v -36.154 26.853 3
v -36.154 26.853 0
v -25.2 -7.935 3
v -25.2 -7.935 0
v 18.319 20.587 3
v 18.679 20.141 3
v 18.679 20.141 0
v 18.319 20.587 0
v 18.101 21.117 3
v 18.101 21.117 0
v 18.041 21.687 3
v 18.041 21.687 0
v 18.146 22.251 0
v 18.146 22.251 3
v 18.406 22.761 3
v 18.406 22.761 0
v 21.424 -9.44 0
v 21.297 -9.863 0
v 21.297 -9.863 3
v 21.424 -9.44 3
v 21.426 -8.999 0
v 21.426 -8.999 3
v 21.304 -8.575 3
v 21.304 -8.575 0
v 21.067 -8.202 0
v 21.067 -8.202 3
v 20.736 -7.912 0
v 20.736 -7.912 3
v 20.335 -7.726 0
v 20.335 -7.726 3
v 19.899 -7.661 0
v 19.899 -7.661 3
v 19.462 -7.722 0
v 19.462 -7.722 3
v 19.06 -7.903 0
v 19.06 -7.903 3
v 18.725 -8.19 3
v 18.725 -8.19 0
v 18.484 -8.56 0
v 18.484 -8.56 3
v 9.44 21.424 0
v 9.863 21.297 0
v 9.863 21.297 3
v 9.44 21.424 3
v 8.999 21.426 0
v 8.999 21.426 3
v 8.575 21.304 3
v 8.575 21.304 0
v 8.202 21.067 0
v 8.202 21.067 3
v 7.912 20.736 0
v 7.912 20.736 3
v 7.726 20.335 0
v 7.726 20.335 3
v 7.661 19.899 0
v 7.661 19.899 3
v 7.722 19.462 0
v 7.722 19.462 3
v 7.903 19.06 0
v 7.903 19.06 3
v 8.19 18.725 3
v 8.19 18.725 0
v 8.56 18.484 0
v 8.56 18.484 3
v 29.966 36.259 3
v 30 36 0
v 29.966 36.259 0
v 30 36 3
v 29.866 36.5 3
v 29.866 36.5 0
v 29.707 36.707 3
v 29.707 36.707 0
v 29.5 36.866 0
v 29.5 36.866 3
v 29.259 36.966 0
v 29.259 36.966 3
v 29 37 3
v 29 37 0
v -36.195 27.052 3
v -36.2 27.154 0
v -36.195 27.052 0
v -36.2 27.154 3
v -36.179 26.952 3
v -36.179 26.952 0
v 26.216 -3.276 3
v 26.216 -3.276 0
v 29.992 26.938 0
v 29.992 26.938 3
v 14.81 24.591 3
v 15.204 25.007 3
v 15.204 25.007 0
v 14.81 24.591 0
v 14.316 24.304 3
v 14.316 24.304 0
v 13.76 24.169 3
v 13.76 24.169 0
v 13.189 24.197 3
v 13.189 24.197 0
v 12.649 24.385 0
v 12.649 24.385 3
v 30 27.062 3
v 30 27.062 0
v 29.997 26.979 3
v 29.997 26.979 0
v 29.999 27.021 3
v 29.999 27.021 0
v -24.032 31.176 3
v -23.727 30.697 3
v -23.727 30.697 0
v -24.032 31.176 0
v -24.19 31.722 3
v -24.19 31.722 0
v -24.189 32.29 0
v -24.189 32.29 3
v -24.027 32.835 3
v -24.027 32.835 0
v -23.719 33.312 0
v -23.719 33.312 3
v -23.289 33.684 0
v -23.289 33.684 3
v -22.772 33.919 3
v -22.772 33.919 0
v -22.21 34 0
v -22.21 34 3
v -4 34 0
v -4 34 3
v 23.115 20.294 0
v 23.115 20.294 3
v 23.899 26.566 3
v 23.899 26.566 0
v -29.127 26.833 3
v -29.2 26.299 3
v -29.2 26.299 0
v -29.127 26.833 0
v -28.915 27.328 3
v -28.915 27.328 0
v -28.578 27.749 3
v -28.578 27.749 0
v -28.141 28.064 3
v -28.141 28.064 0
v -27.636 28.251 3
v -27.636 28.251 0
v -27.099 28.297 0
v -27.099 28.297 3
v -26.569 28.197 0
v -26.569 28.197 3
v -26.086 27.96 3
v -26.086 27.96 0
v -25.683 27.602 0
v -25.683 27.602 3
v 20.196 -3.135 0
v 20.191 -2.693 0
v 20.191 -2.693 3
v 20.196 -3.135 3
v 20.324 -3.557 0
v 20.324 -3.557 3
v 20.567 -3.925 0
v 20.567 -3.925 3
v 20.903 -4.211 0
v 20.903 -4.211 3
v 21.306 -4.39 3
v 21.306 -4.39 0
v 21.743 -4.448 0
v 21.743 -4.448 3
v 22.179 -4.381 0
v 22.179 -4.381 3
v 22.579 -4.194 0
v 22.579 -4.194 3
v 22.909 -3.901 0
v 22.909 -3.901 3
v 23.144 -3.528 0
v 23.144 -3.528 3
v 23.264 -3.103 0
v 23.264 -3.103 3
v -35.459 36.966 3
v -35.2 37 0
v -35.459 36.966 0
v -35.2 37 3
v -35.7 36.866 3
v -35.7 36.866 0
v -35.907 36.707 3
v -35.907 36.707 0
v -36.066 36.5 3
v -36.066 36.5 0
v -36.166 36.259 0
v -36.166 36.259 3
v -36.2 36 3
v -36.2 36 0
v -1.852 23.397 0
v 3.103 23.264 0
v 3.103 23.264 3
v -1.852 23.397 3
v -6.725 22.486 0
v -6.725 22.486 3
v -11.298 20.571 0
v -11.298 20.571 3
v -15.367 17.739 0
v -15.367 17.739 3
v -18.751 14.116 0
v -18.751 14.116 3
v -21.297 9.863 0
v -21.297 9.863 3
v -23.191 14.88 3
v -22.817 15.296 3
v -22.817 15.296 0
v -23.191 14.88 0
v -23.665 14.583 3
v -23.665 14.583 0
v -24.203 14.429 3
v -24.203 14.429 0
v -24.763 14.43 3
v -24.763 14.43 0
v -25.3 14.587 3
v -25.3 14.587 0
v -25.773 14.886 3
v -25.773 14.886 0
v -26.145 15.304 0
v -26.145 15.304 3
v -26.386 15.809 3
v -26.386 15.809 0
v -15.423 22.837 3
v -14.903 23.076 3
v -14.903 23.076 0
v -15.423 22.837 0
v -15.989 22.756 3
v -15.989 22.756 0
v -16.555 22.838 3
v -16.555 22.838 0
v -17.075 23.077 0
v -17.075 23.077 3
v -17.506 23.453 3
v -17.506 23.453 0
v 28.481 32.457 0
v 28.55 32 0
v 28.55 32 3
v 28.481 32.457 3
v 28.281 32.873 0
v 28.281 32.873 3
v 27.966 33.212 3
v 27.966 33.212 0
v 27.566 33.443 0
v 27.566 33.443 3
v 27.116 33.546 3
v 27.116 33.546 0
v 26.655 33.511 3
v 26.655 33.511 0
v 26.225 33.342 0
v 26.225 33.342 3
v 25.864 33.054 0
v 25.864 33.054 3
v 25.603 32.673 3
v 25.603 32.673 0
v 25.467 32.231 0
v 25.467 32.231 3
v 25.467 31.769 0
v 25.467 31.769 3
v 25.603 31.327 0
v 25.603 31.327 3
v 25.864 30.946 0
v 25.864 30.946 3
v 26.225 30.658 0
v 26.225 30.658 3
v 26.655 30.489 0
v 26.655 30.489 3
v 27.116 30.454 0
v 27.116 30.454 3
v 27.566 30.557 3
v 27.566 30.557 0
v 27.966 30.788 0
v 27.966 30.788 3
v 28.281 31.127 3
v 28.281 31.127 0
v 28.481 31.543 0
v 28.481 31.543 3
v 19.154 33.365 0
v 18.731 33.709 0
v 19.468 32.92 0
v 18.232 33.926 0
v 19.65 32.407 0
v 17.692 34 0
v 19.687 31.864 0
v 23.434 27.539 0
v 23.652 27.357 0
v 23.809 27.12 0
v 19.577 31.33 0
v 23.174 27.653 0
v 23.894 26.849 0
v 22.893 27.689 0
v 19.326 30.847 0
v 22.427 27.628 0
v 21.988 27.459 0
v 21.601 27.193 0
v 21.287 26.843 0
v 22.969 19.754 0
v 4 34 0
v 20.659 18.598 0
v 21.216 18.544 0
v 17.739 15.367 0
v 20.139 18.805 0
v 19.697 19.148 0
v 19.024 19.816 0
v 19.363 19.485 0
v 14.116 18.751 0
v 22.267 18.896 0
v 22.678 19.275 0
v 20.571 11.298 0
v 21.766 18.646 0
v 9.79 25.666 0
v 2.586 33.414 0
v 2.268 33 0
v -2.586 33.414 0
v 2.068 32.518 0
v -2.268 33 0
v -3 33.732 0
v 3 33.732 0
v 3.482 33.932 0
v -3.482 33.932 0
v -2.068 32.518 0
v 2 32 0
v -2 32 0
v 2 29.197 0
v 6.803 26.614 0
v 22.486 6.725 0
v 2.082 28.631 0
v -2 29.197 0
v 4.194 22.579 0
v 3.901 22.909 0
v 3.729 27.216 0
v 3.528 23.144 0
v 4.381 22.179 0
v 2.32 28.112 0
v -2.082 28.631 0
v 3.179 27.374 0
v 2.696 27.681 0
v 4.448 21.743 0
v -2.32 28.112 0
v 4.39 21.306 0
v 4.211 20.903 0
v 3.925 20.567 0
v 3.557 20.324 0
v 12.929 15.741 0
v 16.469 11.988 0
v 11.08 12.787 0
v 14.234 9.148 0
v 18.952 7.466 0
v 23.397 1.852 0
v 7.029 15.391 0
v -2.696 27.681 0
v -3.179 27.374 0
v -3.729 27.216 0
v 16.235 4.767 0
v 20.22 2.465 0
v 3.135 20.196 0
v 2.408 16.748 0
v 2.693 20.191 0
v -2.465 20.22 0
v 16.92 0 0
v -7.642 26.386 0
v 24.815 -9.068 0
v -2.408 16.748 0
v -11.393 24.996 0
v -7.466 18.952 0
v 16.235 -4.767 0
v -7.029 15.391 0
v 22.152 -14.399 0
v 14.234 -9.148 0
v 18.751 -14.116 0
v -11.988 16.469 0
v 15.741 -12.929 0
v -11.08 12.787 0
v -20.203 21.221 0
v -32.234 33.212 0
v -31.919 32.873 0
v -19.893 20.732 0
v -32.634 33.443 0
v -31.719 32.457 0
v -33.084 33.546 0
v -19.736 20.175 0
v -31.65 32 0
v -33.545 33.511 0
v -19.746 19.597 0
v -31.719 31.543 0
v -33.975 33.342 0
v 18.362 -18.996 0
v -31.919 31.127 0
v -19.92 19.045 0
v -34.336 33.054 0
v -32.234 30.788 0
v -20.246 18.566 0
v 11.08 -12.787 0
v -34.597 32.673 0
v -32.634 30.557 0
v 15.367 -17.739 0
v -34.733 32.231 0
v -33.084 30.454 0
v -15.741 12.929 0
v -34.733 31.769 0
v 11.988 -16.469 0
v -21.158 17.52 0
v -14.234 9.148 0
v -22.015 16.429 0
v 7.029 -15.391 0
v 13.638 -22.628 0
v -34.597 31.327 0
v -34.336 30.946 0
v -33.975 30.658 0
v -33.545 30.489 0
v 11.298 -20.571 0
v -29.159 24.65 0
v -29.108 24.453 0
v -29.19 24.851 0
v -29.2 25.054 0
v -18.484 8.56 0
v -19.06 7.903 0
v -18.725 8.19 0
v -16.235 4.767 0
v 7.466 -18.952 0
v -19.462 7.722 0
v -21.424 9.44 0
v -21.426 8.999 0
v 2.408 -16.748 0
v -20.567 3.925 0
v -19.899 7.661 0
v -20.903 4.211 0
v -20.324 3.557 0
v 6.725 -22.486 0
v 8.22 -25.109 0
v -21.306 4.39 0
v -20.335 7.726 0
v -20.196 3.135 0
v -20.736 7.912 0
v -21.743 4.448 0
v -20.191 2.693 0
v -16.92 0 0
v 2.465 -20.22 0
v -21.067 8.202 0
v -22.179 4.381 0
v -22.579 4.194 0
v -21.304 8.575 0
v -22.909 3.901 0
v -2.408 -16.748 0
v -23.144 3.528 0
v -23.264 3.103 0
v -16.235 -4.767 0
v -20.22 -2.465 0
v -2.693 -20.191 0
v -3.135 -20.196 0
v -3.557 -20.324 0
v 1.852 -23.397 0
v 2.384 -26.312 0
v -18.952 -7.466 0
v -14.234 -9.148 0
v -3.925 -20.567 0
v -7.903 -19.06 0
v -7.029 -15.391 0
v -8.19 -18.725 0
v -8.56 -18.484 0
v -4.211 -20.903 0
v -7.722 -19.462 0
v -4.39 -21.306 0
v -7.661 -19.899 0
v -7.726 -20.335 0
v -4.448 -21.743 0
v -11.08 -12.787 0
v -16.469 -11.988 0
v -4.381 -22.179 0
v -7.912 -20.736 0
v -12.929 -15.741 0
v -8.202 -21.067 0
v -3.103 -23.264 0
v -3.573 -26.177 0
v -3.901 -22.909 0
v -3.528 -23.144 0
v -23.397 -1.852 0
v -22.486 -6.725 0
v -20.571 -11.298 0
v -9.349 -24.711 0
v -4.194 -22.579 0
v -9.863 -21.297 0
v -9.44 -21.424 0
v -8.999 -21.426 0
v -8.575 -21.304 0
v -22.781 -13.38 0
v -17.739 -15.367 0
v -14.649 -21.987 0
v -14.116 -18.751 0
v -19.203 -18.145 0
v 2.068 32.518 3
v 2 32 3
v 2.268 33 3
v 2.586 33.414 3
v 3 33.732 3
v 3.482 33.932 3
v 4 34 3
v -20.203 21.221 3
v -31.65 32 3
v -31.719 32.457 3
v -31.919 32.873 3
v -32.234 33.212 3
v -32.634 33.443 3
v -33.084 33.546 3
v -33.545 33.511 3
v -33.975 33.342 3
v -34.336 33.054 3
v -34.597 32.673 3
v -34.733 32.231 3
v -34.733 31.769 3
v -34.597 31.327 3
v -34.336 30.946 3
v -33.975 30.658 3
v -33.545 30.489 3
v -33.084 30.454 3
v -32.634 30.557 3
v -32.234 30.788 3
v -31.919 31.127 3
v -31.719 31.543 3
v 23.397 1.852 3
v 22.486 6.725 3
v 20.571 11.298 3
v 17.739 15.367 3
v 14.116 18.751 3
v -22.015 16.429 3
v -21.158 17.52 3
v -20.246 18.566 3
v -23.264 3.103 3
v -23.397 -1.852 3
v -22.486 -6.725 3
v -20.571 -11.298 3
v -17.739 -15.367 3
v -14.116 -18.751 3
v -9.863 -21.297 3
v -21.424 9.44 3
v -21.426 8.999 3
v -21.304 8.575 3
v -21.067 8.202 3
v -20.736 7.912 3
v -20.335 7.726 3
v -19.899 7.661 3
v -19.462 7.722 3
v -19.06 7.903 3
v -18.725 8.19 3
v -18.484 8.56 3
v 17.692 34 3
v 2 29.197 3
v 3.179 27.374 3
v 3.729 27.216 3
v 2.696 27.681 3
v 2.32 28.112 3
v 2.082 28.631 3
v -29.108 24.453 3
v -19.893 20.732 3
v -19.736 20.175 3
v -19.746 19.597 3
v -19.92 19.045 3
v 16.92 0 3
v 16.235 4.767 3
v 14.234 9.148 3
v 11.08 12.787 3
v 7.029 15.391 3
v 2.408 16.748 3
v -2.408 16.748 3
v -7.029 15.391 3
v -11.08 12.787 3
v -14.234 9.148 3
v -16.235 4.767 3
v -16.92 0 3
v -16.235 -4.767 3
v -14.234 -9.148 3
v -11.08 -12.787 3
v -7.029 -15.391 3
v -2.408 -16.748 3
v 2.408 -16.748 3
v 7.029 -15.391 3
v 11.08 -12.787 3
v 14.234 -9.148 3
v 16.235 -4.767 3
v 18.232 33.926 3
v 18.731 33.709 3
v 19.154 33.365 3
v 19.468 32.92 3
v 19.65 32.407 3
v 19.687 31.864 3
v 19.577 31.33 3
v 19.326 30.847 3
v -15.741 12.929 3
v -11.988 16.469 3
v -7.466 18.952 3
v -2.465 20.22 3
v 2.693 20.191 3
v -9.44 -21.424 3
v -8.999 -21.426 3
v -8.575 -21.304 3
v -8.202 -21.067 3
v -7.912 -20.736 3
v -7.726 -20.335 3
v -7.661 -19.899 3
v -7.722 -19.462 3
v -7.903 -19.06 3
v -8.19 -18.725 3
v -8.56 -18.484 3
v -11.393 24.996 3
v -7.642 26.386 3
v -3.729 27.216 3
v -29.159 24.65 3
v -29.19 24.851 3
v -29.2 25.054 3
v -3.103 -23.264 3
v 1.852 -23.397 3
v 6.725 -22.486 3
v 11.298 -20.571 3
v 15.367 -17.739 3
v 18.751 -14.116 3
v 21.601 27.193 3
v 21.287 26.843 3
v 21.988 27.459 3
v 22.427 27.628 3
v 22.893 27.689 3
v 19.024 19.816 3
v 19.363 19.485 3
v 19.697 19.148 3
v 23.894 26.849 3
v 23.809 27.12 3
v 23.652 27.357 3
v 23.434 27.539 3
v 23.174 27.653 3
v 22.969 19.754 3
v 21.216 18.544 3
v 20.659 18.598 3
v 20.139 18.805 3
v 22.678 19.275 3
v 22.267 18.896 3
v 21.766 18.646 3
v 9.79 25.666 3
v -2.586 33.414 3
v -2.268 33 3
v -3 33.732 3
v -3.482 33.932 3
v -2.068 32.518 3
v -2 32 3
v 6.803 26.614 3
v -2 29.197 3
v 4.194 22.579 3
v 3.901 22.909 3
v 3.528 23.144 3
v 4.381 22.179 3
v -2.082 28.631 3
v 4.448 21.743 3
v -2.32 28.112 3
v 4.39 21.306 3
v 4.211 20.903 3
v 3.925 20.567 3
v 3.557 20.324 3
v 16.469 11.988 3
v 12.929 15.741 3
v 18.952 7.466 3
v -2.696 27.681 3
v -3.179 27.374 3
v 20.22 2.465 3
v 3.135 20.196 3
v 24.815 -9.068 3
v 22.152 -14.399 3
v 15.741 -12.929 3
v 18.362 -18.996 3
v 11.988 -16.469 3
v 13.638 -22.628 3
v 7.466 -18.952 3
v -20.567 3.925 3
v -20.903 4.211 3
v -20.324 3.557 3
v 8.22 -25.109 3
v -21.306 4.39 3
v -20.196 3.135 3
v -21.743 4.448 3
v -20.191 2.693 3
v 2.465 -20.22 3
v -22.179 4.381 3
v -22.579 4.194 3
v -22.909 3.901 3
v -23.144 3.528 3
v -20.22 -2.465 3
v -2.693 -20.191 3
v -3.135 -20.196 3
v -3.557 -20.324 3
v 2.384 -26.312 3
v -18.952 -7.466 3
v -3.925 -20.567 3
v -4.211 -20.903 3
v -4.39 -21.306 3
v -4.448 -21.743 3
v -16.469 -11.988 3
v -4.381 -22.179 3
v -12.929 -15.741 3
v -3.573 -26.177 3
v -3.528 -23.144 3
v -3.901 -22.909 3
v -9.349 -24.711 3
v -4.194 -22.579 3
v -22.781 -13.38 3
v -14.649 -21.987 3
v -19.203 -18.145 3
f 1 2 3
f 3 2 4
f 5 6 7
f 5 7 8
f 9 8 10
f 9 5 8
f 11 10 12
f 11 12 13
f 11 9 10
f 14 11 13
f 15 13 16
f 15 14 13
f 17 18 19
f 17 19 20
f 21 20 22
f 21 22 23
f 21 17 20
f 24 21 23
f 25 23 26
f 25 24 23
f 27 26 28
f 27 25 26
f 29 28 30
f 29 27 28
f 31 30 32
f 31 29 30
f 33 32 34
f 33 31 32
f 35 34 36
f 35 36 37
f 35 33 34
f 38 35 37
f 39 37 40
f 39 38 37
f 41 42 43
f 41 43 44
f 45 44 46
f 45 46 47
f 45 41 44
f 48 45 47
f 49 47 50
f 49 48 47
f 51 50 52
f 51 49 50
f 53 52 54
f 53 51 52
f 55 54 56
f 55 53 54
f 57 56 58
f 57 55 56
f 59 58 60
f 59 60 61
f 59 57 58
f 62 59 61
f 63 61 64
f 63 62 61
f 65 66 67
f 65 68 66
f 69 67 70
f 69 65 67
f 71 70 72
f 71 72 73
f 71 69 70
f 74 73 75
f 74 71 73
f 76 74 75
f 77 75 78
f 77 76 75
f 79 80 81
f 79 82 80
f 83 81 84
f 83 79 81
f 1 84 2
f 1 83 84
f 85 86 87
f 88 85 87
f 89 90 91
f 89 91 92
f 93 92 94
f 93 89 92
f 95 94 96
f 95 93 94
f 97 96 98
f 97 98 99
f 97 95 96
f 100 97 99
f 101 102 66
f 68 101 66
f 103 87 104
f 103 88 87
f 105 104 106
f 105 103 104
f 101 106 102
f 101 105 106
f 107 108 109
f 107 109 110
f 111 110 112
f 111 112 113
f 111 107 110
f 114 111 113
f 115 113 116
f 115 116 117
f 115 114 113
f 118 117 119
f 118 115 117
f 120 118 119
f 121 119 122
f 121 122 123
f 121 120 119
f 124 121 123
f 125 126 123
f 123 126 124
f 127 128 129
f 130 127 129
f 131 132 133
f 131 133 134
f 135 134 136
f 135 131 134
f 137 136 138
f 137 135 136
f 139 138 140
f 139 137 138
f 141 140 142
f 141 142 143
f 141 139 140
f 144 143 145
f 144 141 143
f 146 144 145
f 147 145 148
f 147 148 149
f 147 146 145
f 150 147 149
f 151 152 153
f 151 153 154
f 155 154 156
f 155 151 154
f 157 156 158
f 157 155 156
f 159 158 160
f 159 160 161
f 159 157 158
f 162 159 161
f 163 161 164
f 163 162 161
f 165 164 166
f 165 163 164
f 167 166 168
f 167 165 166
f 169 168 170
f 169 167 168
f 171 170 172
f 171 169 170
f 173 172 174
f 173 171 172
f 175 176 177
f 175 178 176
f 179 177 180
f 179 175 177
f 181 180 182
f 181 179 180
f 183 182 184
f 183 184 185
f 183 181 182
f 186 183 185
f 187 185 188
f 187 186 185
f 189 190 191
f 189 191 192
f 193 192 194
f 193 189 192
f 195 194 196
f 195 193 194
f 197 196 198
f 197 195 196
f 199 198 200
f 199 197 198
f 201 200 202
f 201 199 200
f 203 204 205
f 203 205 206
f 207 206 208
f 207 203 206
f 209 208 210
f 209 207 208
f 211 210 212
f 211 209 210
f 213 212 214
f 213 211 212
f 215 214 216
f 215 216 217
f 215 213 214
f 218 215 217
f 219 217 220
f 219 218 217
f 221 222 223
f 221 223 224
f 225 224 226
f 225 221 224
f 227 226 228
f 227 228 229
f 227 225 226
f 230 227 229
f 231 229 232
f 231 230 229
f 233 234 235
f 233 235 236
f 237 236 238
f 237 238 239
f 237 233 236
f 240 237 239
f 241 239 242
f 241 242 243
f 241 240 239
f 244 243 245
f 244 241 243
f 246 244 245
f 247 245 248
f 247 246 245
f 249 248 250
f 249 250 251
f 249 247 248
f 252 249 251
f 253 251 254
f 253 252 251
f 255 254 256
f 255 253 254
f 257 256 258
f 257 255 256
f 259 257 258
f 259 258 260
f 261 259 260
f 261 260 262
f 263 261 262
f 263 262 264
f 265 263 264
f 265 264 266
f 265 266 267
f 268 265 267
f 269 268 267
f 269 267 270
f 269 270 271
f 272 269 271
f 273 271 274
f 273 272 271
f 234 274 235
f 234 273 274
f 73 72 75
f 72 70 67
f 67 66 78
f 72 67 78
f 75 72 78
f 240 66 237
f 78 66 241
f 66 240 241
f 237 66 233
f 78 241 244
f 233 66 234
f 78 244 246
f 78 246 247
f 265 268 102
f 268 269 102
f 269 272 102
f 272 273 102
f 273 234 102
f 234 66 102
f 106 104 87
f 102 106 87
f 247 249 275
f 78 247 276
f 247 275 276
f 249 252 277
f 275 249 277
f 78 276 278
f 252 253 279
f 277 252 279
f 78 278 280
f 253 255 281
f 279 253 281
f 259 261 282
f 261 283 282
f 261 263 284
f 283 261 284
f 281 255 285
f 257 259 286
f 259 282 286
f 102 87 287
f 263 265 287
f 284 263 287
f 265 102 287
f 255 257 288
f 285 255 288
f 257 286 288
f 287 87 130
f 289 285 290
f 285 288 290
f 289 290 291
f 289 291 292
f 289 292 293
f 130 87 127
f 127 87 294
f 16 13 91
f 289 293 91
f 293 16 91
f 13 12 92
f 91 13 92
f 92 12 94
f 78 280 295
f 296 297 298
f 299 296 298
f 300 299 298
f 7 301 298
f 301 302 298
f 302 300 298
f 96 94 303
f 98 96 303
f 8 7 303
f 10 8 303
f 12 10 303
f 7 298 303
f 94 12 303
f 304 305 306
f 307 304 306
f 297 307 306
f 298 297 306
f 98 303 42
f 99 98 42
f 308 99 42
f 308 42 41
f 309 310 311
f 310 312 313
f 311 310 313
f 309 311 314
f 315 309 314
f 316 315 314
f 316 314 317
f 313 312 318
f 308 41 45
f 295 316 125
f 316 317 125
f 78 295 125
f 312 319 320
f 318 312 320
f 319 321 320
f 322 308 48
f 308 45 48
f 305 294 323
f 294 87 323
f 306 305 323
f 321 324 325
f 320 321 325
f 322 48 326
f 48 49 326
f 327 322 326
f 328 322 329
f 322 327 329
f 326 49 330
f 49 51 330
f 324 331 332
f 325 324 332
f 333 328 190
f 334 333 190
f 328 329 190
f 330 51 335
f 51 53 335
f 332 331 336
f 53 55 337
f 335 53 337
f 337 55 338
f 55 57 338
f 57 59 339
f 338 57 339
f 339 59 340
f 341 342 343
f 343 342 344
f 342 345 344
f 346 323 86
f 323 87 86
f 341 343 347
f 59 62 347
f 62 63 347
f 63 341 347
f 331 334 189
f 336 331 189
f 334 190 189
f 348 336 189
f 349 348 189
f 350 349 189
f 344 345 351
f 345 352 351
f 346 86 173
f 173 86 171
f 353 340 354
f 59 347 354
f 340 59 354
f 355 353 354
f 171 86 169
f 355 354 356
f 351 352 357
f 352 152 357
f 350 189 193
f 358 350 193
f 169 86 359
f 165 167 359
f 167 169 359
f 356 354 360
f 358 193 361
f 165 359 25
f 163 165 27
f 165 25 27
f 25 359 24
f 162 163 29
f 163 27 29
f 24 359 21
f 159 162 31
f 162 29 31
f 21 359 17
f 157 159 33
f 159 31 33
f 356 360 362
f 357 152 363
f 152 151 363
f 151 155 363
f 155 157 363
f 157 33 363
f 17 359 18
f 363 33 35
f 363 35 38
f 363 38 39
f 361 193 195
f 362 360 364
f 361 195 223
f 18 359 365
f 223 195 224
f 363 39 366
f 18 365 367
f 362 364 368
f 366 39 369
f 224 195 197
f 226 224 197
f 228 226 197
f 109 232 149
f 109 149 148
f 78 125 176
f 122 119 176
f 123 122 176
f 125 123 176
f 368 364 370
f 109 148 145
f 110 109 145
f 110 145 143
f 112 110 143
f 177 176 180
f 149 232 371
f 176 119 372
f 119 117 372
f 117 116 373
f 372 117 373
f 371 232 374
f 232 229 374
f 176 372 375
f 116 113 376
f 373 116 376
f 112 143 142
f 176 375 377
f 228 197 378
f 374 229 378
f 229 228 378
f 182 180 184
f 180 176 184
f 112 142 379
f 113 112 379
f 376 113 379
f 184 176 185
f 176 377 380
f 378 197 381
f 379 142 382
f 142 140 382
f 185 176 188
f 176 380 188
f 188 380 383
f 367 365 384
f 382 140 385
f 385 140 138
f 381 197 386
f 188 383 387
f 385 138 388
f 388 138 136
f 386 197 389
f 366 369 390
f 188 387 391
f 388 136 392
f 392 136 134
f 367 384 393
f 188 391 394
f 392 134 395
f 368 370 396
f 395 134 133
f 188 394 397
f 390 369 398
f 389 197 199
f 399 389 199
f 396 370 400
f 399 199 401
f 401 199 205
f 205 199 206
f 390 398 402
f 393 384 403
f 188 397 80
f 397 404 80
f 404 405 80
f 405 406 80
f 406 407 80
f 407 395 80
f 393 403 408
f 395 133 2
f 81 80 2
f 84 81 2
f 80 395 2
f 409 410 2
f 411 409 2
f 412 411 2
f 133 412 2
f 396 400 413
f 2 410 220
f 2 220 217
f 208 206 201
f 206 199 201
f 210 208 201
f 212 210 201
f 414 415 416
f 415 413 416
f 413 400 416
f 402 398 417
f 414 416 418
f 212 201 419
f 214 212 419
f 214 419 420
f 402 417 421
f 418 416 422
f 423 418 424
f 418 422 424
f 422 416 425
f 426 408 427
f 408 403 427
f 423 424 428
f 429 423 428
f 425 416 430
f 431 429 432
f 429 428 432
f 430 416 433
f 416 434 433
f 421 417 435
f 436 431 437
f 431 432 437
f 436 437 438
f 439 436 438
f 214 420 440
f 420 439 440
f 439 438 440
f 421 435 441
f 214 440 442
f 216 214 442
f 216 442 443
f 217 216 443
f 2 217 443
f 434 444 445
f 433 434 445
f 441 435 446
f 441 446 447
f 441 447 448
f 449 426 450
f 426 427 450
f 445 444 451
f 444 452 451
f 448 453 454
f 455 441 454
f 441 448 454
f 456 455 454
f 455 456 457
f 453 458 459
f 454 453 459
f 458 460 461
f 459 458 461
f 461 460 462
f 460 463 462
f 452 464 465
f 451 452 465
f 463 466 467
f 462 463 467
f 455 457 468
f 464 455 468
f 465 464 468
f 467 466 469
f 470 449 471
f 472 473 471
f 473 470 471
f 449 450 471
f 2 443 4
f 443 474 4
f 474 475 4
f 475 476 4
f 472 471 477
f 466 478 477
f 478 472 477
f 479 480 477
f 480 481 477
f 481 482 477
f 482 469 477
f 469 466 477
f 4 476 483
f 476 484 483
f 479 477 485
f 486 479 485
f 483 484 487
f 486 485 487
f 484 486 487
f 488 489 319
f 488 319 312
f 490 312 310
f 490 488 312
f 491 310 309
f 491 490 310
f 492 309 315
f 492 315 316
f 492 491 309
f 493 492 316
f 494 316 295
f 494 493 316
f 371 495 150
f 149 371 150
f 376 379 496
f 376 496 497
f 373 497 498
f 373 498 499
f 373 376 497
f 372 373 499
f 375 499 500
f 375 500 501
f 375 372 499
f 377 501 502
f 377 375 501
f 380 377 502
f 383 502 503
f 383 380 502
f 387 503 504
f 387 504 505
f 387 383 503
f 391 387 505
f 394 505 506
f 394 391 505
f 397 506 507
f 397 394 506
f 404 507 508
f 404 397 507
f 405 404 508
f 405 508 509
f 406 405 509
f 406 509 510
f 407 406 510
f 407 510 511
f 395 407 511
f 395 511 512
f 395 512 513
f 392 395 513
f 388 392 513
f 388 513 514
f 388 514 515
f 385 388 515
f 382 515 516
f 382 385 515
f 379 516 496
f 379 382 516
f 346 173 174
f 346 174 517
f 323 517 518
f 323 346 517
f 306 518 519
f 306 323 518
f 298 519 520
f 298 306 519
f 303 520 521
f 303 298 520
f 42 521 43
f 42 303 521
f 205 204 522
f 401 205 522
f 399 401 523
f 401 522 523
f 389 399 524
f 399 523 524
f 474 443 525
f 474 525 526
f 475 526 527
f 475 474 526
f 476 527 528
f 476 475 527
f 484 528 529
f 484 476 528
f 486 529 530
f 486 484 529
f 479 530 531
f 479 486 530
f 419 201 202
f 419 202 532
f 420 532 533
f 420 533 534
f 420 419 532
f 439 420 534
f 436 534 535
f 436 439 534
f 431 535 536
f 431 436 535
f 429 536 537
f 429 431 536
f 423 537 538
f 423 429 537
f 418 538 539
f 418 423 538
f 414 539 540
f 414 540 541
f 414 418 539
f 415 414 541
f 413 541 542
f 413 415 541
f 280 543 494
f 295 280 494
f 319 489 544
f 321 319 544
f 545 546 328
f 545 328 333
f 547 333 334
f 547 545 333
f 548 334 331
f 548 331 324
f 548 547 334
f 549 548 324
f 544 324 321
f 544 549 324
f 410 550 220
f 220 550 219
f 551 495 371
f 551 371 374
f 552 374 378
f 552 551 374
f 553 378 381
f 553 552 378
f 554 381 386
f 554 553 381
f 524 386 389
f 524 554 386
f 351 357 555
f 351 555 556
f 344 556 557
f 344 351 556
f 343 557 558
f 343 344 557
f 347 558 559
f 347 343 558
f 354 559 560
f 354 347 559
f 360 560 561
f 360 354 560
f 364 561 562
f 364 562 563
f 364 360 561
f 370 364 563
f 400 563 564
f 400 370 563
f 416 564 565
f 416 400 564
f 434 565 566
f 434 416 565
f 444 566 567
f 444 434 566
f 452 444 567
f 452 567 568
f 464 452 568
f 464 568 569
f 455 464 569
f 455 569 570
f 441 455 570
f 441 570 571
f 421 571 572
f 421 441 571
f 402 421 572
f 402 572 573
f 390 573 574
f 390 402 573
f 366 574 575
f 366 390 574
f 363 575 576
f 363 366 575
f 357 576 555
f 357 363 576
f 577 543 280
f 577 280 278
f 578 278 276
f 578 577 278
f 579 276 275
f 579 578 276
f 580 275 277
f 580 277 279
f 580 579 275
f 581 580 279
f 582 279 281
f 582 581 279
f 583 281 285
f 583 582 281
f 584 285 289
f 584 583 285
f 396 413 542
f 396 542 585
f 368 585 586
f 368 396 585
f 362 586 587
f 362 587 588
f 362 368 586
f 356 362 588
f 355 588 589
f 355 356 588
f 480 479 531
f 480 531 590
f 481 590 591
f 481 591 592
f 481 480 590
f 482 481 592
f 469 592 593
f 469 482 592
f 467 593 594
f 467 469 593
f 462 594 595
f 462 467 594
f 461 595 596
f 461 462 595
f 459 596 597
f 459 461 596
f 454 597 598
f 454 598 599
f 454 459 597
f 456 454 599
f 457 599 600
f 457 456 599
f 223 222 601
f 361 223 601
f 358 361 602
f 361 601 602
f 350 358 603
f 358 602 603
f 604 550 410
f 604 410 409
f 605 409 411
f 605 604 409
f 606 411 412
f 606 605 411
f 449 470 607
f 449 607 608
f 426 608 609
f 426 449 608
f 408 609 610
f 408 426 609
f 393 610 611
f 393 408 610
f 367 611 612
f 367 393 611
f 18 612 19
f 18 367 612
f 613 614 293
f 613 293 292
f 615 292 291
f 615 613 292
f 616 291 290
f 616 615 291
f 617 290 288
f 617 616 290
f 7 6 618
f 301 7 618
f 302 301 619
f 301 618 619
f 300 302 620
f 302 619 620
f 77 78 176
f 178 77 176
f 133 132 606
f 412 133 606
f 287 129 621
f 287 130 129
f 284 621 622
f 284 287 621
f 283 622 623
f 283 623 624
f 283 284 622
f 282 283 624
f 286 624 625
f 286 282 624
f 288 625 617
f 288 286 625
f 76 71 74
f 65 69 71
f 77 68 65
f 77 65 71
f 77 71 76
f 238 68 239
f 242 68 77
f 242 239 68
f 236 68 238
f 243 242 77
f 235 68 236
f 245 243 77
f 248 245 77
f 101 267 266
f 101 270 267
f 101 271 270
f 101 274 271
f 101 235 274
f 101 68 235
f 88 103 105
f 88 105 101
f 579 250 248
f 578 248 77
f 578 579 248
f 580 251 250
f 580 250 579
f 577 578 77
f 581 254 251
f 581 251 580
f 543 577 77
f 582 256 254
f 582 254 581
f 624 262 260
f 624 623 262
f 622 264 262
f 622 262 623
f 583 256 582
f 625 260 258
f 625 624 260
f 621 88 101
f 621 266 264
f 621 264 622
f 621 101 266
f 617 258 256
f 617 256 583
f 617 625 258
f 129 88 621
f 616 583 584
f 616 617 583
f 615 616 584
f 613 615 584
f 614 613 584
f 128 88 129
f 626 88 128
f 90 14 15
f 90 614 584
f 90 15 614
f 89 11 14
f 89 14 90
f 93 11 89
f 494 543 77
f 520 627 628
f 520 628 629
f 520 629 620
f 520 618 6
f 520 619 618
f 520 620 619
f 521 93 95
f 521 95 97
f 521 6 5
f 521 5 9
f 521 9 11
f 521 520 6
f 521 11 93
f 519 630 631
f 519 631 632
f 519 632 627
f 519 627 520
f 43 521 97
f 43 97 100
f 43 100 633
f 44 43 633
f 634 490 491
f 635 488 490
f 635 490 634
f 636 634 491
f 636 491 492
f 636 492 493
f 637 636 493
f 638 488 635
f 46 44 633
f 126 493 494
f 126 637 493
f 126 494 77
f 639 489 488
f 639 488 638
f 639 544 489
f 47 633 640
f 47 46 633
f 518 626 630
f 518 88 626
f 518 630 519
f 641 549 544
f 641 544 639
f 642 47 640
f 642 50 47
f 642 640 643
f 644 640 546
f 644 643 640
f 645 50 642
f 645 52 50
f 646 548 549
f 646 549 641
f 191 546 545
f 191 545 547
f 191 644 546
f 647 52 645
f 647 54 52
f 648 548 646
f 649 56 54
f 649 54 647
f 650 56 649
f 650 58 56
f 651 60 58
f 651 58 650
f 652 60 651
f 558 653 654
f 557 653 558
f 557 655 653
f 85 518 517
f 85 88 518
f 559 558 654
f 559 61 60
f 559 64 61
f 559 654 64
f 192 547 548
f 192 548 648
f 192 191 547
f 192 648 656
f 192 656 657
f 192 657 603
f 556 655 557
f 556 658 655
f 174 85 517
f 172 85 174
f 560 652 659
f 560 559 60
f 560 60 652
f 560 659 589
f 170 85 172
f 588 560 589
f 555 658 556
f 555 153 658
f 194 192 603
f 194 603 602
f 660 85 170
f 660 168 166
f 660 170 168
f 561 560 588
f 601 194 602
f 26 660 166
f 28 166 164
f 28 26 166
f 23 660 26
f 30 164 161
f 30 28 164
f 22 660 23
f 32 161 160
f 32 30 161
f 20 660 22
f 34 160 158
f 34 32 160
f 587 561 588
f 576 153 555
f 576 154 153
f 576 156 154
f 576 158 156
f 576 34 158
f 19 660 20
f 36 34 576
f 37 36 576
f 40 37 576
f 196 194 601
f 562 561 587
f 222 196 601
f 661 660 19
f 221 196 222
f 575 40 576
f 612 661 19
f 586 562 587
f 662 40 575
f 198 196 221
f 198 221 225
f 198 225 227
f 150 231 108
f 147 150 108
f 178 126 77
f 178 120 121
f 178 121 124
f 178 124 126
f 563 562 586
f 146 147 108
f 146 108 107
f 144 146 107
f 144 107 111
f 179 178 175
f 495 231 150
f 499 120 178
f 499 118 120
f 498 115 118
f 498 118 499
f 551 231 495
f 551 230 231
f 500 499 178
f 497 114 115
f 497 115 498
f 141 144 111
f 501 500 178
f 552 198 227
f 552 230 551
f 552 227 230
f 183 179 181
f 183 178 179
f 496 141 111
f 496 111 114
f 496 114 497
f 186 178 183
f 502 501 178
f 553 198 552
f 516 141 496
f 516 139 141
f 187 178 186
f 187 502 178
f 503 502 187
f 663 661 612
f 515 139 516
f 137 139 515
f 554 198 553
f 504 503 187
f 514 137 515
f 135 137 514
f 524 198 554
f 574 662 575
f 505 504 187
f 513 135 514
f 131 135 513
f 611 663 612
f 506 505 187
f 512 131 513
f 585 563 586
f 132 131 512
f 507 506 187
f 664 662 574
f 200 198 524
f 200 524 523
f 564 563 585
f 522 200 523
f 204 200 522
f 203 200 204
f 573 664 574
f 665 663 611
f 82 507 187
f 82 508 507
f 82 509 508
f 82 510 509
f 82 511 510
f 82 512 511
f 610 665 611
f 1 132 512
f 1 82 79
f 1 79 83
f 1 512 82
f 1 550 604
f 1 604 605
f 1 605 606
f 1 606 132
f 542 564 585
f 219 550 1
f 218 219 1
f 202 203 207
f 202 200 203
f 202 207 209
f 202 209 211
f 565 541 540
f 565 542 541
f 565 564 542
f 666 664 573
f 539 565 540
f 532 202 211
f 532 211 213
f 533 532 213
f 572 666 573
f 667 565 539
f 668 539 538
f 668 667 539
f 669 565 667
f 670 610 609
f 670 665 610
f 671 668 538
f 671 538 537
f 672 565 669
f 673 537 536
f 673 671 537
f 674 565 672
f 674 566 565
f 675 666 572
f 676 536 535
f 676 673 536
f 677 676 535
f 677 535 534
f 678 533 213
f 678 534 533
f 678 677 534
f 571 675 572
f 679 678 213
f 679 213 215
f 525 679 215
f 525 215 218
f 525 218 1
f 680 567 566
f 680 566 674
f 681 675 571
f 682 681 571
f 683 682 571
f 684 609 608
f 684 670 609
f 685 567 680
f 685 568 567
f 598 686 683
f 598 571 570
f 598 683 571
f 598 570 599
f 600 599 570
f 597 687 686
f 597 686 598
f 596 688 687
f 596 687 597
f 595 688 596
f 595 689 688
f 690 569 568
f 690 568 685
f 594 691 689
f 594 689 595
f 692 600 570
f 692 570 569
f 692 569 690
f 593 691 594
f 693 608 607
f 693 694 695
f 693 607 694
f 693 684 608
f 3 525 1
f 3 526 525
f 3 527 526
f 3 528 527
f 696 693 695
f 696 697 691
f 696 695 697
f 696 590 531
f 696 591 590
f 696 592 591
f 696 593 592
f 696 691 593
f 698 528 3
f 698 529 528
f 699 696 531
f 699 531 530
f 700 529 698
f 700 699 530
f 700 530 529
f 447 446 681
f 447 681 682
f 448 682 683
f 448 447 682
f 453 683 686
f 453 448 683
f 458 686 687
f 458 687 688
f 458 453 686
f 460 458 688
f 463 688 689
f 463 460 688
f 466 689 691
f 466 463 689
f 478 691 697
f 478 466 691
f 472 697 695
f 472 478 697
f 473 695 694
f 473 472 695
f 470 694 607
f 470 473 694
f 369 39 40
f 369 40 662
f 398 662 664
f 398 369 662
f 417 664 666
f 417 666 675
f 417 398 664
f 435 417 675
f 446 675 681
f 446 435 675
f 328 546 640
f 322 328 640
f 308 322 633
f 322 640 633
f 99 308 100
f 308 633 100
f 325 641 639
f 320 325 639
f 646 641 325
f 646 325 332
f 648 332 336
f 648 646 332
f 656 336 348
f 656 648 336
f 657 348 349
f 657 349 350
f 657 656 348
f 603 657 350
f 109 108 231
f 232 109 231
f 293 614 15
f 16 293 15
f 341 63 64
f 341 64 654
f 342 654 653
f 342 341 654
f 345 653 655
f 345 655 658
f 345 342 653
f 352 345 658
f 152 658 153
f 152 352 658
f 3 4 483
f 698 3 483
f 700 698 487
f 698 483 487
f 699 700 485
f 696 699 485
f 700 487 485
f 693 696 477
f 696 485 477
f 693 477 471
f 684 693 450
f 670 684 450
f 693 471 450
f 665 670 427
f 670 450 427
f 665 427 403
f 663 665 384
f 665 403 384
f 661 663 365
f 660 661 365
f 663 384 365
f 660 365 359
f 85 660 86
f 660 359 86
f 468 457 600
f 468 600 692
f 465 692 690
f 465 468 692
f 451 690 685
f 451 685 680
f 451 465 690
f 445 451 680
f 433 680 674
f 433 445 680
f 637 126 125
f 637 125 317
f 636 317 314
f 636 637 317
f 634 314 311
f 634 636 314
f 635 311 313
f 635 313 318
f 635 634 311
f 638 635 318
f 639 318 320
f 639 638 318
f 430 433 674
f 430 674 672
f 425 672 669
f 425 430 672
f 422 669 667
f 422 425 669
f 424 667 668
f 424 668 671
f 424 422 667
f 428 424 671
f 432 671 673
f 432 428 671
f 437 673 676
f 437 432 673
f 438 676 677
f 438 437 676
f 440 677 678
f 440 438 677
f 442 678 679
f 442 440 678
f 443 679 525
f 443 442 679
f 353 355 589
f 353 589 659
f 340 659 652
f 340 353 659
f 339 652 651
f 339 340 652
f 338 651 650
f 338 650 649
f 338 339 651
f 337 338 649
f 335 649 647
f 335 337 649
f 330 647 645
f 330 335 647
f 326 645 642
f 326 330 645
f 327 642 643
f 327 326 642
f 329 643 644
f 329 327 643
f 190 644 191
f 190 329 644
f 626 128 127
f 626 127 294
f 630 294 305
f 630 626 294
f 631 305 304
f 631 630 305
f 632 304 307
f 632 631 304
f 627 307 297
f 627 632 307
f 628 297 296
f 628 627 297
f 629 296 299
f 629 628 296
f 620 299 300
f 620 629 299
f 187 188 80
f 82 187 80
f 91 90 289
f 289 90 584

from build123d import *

# Parameters (mm, degrees)
SKETCH_1_R          = 1.55
SKETCH_1_R_2        = 26.42
SKETCH_1_R_3        = 16.92
EXTRUDE_1_DEPTH     = 3
CUT_EXTRUDE_1_DEPTH = 3
FILLET_2_R          = 2
FILLET_3_R          = 1
FILLET_4_R          = 1


with BuildPart() as part:
    # 草图1 → 凸台-拉伸1 (new body)
    # profile 1 of 2: a face of its own
    with BuildSketch(Plane.XY):
        with BuildLine():
            Line((30, 37), (-36.2, 37))
            Line((-36.2, 37), (-36.2, 27))
            Line((-36.2, 27), (-25.200345341, -7.93467042))
            ThreePointArc((-25.200345341, -7.93467042), (-4.013930498, 26.113306224), (26.42, 0))
            ThreePointArc((26.42, 0), (26.368962228, -1.641411281), (26.216046102, -3.276480854))
            Line((26.216046102, -3.276480854), (30, 27))
            Line((30, 27), (30, 37))
        make_face()
        with Locations((-33.2, 32)):
            Circle(SKETCH_1_R, mode=Mode.SUBTRACT)
        with Locations((27, 32)):
            Circle(SKETCH_1_R, mode=Mode.SUBTRACT)
    # profile 2 of 2: a face of its own
    with BuildSketch(Plane.XY):
        Circle(SKETCH_1_R_2)
        Circle(SKETCH_1_R_3, mode=Mode.SUBTRACT)
        with BuildLine():
            ThreePointArc((-23.263933046, 3.103275567), (-20.571496751, -11.298425617), (-9.862515799, -21.297222404))
            ThreePointArc((-9.862515799, -21.297222404), (-7.804671989, -20.542054307), (-8.559840086, -18.484210497))
            ThreePointArc((-8.559840086, -18.484210497), (-17.854341236, -9.806089894), (-20.191151092, 2.693384035))
            ThreePointArc((-20.191151092, 2.693384035), (-21.522596303, 4.434720778), (-23.263933046, 3.103275567))
        make_face(mode=Mode.SUBTRACT)
        with BuildLine():
            ThreePointArc((-3.103275567, -23.263933046), (11.298425617, -20.571496751), (21.297222404, -9.862515799))
            ThreePointArc((21.297222404, -9.862515799), (20.542054307, -7.804671989), (18.484210497, -8.559840086))
            ThreePointArc((18.484210497, -8.559840086), (9.806089894, -17.854341236), (-2.693384035, -20.191151092))
            ThreePointArc((-2.693384035, -20.191151092), (-4.434720778, -21.522596303), (-3.103275567, -23.263933046))
        make_face(mode=Mode.SUBTRACT)
        with BuildLine():
            ThreePointArc((23.263933046, -3.103275567), (20.571496751, 11.298425617), (9.862515799, 21.297222404))
            ThreePointArc((9.862515799, 21.297222404), (7.804671989, 20.542054307), (8.559840086, 18.484210497))
            ThreePointArc((8.559840086, 18.484210497), (17.854341236, 9.806089894), (20.191151092, -2.693384035))
            ThreePointArc((20.191151092, -2.693384035), (21.522596303, -4.434720778), (23.263933046, -3.103275567))
        make_face(mode=Mode.SUBTRACT)
        with BuildLine():
            ThreePointArc((3.103275567, 23.263933046), (-11.298425617, 20.571496751), (-21.297222404, 9.862515799))
            ThreePointArc((-21.297222404, 9.862515799), (-20.542054307, 7.804671989), (-18.484210497, 8.559840086))
            ThreePointArc((-18.484210497, 8.559840086), (-9.806089894, 17.854341236), (2.693384035, 20.191151092))
            ThreePointArc((2.693384035, 20.191151092), (4.434720778, 21.522596303), (3.103275567, 23.263933046))
        make_face(mode=Mode.SUBTRACT)
    extrude(amount=EXTRUDE_1_DEPTH)

    # 草图2 → 切除-拉伸1 (cut)
    with BuildSketch(Plane.XY.offset(3)):
        with BuildLine():
            Line((-19.008658137, 19.831082064), (-29.2, 31.697713001))
            Line((-29.2, 31.697713001), (-29.2, 24.746293615))
            Line((-29.2, 24.746293615), (-24.995728208, 11.393615376))
            ThreePointArc((-24.995728208, 11.393615376), (-22.40299568, 15.896750755), (-19.008658137, 19.831082064))
        make_face()
        with BuildLine():
            Line((-2, 34), (-26.563655671, 34))
            Line((-26.563655671, 34), (-16.332670153, 22.087208643))
            ThreePointArc((-16.332670153, 22.087208643), (-9.543082634, 25.759085268), (-2, 27.397096561))
            Line((-2, 27.397096561), (-2, 34))
        make_face()
        with BuildLine():
            Line((2, 34), (2, 27.397096561))
            ThreePointArc((2, 27.397096561), (8.310120791, 26.18287212), (14.165509523, 23.535913833))
            Line((14.165509523, 23.535913833), (21.551923289, 34))
            Line((21.551923289, 34), (2, 34))
        make_face()
        with BuildLine():
            ThreePointArc((17.364100225, 21.285885544), (20.1471001, 18.673383667), (22.541088548, 15.7003257))
            Line((22.541088548, 15.7003257), (24, 27.373487117))
            Line((24, 27.373487117), (24, 30.686743559))
            Line((24, 30.686743559), (17.364100225, 21.285885544))
        make_face()
    extrude(amount=-CUT_EXTRUDE_1_DEPTH, mode=Mode.SUBTRACT)

    # 圆角2
    # the kernel refuses this fillet: 2 mm, written as the material it adds along each edge
    with BuildSketch(Plane(origin=(-24.995728208, 11.393615376, 3), x_dir=(-0.30032817640005316, 0.9538359326740729, 0), z_dir=(0, 0, -1))) as fillet_2_piece_1:
        with BuildLine():
            CenterArc((4.629449301, 2), FILLET_2_R, 141.314699256, 128.685300744)
            Line((3.068267725, 3.250084832), (3.037044093, 3.275086529))
            ThreePointArc((3.037044093, 3.275086529), (1.571259467, 1.589993702), (-0.026755823, 0.029734256))
            Line((-0.026755823, 0.029734256), (0, -0.04))
            Line((0, -0.04), (4.629449301, -0.04))
            Line((4.629449301, -0.04), (4.629449301, 0))
        make_face()
    extrude(amount=3)
    with BuildSketch(Plane(origin=(-29.2, 31.697713001, 3), x_dir=(0.6515260697252437, -0.7586262455704896, 0), z_dir=(0, 0, -1))) as fillet_2_piece_2:
        with BuildLine():
            CenterArc((FILLET_2_R * 2.69924156114, FILLET_2_R), FILLET_2_R, 130.656760048, 139.343239952)
            Line((FILLET_2_R * 2.04771549142, FILLET_2_R * 1.75862624557), (FILLET_2_R * 2.03468497002, FILLET_2_R * 1.77379877048))
            Line((FILLET_2_R * 2.03468497002, FILLET_2_R * 1.77379877048), (-FILLET_2_R * 0.0130305213945, FILLET_2_R * 0.0151725249114))
            Line((-FILLET_2_R * 0.0130305213945, FILLET_2_R * 0.0151725249114), (0, -FILLET_2_R * 0.02))
            Line((0, -FILLET_2_R * 0.02), (FILLET_2_R * 2.69924156114, -FILLET_2_R * 0.02))
            Line((FILLET_2_R * 2.69924156114, -FILLET_2_R * 0.02), (FILLET_2_R * 2.69924156114, 0))
        make_face()
    extrude(amount=3)
    with BuildSketch(Plane(origin=(-19.008658137, 19.831082064, 3), x_dir=(-0.6515260697252421, 0.758626245570491, 0), z_dir=(0, 0, -1))) as fillet_2_piece_3:
        with BuildLine():
            CenterArc((1.832407752, -2), FILLET_2_R, 90, 83.179176321)
            Line((-0.153437067, -1.762470309), (-0.193153964, -1.757719715))
            ThreePointArc((-0.193153964, -1.757719715), (-0.102375692, -0.879001495), (-0.039940321, 0.002184201))
            Line((-0.039940321, 0.002184201), (0, 0.04))
            Line((0, 0.04), (1.832407752, 0.04))
            Line((1.832407752, 0.04), (1.832407752, 0))
        make_face()
    extrude(amount=3)
    with BuildSketch(Plane(origin=(-29.2, 24.746293615, 3), x_dir=(0, 1, 0), z_dir=(0, 0, -1))) as fillet_2_piece_4:
        with BuildLine():
            CenterArc((FILLET_2_R * 0.153712075501, FILLET_2_R), FILLET_2_R, 252.522684781, 17.477315219)
            Line((-FILLET_2_R * 0.146616100899, FILLET_2_R * 0.0461640673259), (-FILLET_2_R * 0.152622664427, FILLET_2_R * 0.0270873486724))
            Line((-FILLET_2_R * 0.152622664427, FILLET_2_R * 0.0270873486724), (-FILLET_2_R * 0.00307424151002, -FILLET_2_R * 0.02))
            Line((-FILLET_2_R * 0.00307424151002, -FILLET_2_R * 0.02), (FILLET_2_R * 0.153712075501, -FILLET_2_R * 0.02))
            Line((FILLET_2_R * 0.153712075501, -FILLET_2_R * 0.02), (FILLET_2_R * 0.153712075501, 0))
        make_face()
    extrude(amount=3)
    with BuildSketch(Plane(origin=(24, 30.686743559, 3), x_dir=(0, -1, 0), z_dir=(0, 0, -1))) as fillet_2_piece_5:
        with BuildLine():
            CenterArc((4.997060807, 1.079260329), FILLET_2_R, 125.217592968, 87.440873122)
            Line((3.843694412, 2.713196056), (3.820627084, 2.74587477))
            Line((3.820627084, 2.74587477), (-0.023067328, 0.032678715))
            Line((-0.023067328, 0.032678715), (0, -0.04))
            ThreePointArc((0, -0.04), (1.656628221, -0.04), (3.279580354, -0.021585207))
            Line((3.279580354, -0.021585207), (3.313256441, 0))
        make_face()
    extrude(amount=3)
    with BuildSketch(Plane(origin=(22.541088548, 15.7003257, 3), x_dir=(-0.6364068134121097, 0.7713535945613038, 0), z_dir=(0, 0, -1))) as fillet_2_piece_6:
        with BuildLine():
            CenterArc((4.632307724, 1.993370508), FILLET_2_R, 136.64829025, 128.685300744)
            Line((3.17800071, 3.366320293), (3.14891457, 3.393779288))
            Line((3.14891457, 3.393779288), (-0.02908614, 0.027458996))
            Line((-0.02908614, 0.027458996), (0.003254168, -0.03986741))
            ThreePointArc((0.003254168, -0.03986741), (2.234799669, 0.051056075), (4.466345171, -0.03986741))
            Line((4.466345171, -0.03986741), (4.469599338, 0))
        make_face()
    extrude(amount=3)
    with BuildSketch(Plane(origin=(17.364100225, 21.285885544, 3), x_dir=(0.7544268815808631, -0.6563840951365095, 0), z_dir=(0, 0, -1))) as fillet_2_piece_7:
        with BuildLine():
            CenterArc((1.80701637, -1.998992608), FILLET_2_R, 91.818612545, 82.374297542)
            Line((-0.182720022, -1.796633797), (-0.22251475, -1.792586621))
            Line((-0.22251475, -1.792586621), (-0.039794728, 0.004047176))
            Line((-0.039794728, 0.004047176), (0.001269418, 0.039979852))
            ThreePointArc((0.001269418, 0.039979852), (0.871772738, 0.026163466), (1.742276058, 0.039979852))
            Line((1.742276058, 0.039979852), (1.743545476, 0))
        make_face()
    extrude(amount=3)
    with BuildSketch(Plane(origin=(2, 27.397096561, 3), x_dir=(0.9945436589558404, -0.10432118879081512, 0), z_dir=(0, 0, -1)), Plane(origin=(-16.332670153, 22.087208643, 3), x_dir=(0.8224548961715518, 0.5688303295038354, 0), z_dir=(0, 0, -1))) as fillet_2_piece_8:
        with BuildLine():
            CenterArc((1.801290505, -1.998998983), FILLET_2_R, 91.812848009, 82.19909323)
            Line((-0.187796813, -1.790356606), (-0.227578559, -1.786183758))
            Line((-0.227578559, -1.786183758), (-0.039781746, 0.004172848))
            Line((-0.039781746, 0.004172848), (0.001265396, 0.03997998))
            ThreePointArc((0.001265396, 0.03997998), (0.869010365, 0.026251037), (1.736755334, 0.03997998))
            Line((1.736755334, 0.03997998), (1.73802073, 0))
        make_face()
    extrude(amount=3)
    with BuildSketch(Plane(origin=(21.551923289, 34, 3), x_dir=(-0.576683197598655, -0.8169678632647618, 0), z_dir=(0, 0, -1))) as fillet_2_piece_9:
        with BuildLine():
            CenterArc((FILLET_2_R * 1.92992070863, FILLET_2_R), FILLET_2_R, 144.782407032, 125.217592968)
            Line((FILLET_2_R * 1.11295284536, FILLET_2_R * 1.5766831976), (FILLET_2_R * 1.0966134881, FILLET_2_R * 1.58821686155))
            Line((FILLET_2_R * 1.0966134881, FILLET_2_R * 1.58821686155), (-FILLET_2_R * 0.0163393572653, FILLET_2_R * 0.011533663952))
            Line((-FILLET_2_R * 0.0163393572653, FILLET_2_R * 0.011533663952), (0, -FILLET_2_R * 0.02))
            Line((0, -FILLET_2_R * 0.02), (FILLET_2_R * 1.92992070863, -FILLET_2_R * 0.02))
            Line((FILLET_2_R * 1.92992070863, -FILLET_2_R * 0.02), (FILLET_2_R * 1.92992070863, 0))
        make_face()
    extrude(amount=3)
    with BuildSketch(Plane(origin=(14.165509523, 23.535913833, 3), x_dir=(-0.8726704847098519, 0.4883095586984472, 0), z_dir=(0, 0, -1)), Plane(origin=(-2, 27.397096561, 3), x_dir=(-0.9945436589558406, -0.10432118879081306, 0), z_dir=(0, 0, -1))) as fillet_2_piece_10:
        with BuildLine():
            CenterArc((1.801290505, 1.998998983), FILLET_2_R, 185.988058762, 82.19909323)
            Line((-0.187796813, 1.790356606), (-0.227578559, 1.786183758))
            Line((-0.227578559, 1.786183758), (-0.039781746, -0.004172848))
            Line((-0.039781746, -0.004172848), (0.001265396, -0.03997998))
            ThreePointArc((0.001265396, -0.03997998), (0.869010365, -0.026251037), (1.736755334, -0.03997998))
            Line((1.736755334, -0.03997998), (1.73802073, 0))
        make_face()
    extrude(amount=3)
    with BuildSketch(Plane(origin=(2, 34, 3), x_dir=(1, 0, 0), z_dir=(0, 0, -1)), Plane(origin=(-2, 34, 3), x_dir=(0, -1, 0), z_dir=(0, 0, -1))) as fillet_2_piece_11:
        with BuildLine():
            CenterArc((FILLET_2_R, FILLET_2_R), FILLET_2_R, 180, 90)
            Line((0, FILLET_2_R), (-FILLET_2_R * 0.02, FILLET_2_R))
            Line((-FILLET_2_R * 0.02, FILLET_2_R), (-FILLET_2_R * 0.02, -FILLET_2_R * 0.02))
            Line((-FILLET_2_R * 0.02, -FILLET_2_R * 0.02), (FILLET_2_R, -FILLET_2_R * 0.02))
            Line((FILLET_2_R, -FILLET_2_R * 0.02), (FILLET_2_R, 0))
        make_face()
    extrude(amount=3)
    with BuildSketch(Plane(origin=(-26.563655671, 34, 3), x_dir=(1, 0, 0), z_dir=(0, 0, -1))) as fillet_2_piece_12:
        with BuildLine():
            CenterArc((FILLET_2_R * 2.17699569369, FILLET_2_R), FILLET_2_R, 139.343239952, 130.656760048)
            Line((FILLET_2_R * 1.41836944812, FILLET_2_R * 1.65152606973), (FILLET_2_R * 1.40319692321, FILLET_2_R * 1.66455659112))
            Line((FILLET_2_R * 1.40319692321, FILLET_2_R * 1.66455659112), (-FILLET_2_R * 0.0151725249114, FILLET_2_R * 0.0130305213945))
            Line((-FILLET_2_R * 0.0151725249114, FILLET_2_R * 0.0130305213945), (0, -FILLET_2_R * 0.02))
            Line((0, -FILLET_2_R * 0.02), (FILLET_2_R * 2.17699569369, -FILLET_2_R * 0.02))
            Line((FILLET_2_R * 2.17699569369, -FILLET_2_R * 0.02), (FILLET_2_R * 2.17699569369, 0))
        make_face()
    extrude(amount=3)

    # 圆角3
    fillet_3_edges = [part.edges().sort_by_distance(p)[0] for p in [
        (24, 27.373487117, 1.5),
    ]]
    fillet(fillet_3_edges, radius=FILLET_3_R)

    # 圆角4
    fillet_4_edges = [part.edges().sort_by_distance(p)[0] for p in [
        (-36.2, 27, 1.5),
        (-36.2, 37, 1.5),
        (30, 37, 1.5),
        (30, 27, 1.5),
    ]]
    fillet(fillet_4_edges, radius=FILLET_4_R)


solid = part.part
